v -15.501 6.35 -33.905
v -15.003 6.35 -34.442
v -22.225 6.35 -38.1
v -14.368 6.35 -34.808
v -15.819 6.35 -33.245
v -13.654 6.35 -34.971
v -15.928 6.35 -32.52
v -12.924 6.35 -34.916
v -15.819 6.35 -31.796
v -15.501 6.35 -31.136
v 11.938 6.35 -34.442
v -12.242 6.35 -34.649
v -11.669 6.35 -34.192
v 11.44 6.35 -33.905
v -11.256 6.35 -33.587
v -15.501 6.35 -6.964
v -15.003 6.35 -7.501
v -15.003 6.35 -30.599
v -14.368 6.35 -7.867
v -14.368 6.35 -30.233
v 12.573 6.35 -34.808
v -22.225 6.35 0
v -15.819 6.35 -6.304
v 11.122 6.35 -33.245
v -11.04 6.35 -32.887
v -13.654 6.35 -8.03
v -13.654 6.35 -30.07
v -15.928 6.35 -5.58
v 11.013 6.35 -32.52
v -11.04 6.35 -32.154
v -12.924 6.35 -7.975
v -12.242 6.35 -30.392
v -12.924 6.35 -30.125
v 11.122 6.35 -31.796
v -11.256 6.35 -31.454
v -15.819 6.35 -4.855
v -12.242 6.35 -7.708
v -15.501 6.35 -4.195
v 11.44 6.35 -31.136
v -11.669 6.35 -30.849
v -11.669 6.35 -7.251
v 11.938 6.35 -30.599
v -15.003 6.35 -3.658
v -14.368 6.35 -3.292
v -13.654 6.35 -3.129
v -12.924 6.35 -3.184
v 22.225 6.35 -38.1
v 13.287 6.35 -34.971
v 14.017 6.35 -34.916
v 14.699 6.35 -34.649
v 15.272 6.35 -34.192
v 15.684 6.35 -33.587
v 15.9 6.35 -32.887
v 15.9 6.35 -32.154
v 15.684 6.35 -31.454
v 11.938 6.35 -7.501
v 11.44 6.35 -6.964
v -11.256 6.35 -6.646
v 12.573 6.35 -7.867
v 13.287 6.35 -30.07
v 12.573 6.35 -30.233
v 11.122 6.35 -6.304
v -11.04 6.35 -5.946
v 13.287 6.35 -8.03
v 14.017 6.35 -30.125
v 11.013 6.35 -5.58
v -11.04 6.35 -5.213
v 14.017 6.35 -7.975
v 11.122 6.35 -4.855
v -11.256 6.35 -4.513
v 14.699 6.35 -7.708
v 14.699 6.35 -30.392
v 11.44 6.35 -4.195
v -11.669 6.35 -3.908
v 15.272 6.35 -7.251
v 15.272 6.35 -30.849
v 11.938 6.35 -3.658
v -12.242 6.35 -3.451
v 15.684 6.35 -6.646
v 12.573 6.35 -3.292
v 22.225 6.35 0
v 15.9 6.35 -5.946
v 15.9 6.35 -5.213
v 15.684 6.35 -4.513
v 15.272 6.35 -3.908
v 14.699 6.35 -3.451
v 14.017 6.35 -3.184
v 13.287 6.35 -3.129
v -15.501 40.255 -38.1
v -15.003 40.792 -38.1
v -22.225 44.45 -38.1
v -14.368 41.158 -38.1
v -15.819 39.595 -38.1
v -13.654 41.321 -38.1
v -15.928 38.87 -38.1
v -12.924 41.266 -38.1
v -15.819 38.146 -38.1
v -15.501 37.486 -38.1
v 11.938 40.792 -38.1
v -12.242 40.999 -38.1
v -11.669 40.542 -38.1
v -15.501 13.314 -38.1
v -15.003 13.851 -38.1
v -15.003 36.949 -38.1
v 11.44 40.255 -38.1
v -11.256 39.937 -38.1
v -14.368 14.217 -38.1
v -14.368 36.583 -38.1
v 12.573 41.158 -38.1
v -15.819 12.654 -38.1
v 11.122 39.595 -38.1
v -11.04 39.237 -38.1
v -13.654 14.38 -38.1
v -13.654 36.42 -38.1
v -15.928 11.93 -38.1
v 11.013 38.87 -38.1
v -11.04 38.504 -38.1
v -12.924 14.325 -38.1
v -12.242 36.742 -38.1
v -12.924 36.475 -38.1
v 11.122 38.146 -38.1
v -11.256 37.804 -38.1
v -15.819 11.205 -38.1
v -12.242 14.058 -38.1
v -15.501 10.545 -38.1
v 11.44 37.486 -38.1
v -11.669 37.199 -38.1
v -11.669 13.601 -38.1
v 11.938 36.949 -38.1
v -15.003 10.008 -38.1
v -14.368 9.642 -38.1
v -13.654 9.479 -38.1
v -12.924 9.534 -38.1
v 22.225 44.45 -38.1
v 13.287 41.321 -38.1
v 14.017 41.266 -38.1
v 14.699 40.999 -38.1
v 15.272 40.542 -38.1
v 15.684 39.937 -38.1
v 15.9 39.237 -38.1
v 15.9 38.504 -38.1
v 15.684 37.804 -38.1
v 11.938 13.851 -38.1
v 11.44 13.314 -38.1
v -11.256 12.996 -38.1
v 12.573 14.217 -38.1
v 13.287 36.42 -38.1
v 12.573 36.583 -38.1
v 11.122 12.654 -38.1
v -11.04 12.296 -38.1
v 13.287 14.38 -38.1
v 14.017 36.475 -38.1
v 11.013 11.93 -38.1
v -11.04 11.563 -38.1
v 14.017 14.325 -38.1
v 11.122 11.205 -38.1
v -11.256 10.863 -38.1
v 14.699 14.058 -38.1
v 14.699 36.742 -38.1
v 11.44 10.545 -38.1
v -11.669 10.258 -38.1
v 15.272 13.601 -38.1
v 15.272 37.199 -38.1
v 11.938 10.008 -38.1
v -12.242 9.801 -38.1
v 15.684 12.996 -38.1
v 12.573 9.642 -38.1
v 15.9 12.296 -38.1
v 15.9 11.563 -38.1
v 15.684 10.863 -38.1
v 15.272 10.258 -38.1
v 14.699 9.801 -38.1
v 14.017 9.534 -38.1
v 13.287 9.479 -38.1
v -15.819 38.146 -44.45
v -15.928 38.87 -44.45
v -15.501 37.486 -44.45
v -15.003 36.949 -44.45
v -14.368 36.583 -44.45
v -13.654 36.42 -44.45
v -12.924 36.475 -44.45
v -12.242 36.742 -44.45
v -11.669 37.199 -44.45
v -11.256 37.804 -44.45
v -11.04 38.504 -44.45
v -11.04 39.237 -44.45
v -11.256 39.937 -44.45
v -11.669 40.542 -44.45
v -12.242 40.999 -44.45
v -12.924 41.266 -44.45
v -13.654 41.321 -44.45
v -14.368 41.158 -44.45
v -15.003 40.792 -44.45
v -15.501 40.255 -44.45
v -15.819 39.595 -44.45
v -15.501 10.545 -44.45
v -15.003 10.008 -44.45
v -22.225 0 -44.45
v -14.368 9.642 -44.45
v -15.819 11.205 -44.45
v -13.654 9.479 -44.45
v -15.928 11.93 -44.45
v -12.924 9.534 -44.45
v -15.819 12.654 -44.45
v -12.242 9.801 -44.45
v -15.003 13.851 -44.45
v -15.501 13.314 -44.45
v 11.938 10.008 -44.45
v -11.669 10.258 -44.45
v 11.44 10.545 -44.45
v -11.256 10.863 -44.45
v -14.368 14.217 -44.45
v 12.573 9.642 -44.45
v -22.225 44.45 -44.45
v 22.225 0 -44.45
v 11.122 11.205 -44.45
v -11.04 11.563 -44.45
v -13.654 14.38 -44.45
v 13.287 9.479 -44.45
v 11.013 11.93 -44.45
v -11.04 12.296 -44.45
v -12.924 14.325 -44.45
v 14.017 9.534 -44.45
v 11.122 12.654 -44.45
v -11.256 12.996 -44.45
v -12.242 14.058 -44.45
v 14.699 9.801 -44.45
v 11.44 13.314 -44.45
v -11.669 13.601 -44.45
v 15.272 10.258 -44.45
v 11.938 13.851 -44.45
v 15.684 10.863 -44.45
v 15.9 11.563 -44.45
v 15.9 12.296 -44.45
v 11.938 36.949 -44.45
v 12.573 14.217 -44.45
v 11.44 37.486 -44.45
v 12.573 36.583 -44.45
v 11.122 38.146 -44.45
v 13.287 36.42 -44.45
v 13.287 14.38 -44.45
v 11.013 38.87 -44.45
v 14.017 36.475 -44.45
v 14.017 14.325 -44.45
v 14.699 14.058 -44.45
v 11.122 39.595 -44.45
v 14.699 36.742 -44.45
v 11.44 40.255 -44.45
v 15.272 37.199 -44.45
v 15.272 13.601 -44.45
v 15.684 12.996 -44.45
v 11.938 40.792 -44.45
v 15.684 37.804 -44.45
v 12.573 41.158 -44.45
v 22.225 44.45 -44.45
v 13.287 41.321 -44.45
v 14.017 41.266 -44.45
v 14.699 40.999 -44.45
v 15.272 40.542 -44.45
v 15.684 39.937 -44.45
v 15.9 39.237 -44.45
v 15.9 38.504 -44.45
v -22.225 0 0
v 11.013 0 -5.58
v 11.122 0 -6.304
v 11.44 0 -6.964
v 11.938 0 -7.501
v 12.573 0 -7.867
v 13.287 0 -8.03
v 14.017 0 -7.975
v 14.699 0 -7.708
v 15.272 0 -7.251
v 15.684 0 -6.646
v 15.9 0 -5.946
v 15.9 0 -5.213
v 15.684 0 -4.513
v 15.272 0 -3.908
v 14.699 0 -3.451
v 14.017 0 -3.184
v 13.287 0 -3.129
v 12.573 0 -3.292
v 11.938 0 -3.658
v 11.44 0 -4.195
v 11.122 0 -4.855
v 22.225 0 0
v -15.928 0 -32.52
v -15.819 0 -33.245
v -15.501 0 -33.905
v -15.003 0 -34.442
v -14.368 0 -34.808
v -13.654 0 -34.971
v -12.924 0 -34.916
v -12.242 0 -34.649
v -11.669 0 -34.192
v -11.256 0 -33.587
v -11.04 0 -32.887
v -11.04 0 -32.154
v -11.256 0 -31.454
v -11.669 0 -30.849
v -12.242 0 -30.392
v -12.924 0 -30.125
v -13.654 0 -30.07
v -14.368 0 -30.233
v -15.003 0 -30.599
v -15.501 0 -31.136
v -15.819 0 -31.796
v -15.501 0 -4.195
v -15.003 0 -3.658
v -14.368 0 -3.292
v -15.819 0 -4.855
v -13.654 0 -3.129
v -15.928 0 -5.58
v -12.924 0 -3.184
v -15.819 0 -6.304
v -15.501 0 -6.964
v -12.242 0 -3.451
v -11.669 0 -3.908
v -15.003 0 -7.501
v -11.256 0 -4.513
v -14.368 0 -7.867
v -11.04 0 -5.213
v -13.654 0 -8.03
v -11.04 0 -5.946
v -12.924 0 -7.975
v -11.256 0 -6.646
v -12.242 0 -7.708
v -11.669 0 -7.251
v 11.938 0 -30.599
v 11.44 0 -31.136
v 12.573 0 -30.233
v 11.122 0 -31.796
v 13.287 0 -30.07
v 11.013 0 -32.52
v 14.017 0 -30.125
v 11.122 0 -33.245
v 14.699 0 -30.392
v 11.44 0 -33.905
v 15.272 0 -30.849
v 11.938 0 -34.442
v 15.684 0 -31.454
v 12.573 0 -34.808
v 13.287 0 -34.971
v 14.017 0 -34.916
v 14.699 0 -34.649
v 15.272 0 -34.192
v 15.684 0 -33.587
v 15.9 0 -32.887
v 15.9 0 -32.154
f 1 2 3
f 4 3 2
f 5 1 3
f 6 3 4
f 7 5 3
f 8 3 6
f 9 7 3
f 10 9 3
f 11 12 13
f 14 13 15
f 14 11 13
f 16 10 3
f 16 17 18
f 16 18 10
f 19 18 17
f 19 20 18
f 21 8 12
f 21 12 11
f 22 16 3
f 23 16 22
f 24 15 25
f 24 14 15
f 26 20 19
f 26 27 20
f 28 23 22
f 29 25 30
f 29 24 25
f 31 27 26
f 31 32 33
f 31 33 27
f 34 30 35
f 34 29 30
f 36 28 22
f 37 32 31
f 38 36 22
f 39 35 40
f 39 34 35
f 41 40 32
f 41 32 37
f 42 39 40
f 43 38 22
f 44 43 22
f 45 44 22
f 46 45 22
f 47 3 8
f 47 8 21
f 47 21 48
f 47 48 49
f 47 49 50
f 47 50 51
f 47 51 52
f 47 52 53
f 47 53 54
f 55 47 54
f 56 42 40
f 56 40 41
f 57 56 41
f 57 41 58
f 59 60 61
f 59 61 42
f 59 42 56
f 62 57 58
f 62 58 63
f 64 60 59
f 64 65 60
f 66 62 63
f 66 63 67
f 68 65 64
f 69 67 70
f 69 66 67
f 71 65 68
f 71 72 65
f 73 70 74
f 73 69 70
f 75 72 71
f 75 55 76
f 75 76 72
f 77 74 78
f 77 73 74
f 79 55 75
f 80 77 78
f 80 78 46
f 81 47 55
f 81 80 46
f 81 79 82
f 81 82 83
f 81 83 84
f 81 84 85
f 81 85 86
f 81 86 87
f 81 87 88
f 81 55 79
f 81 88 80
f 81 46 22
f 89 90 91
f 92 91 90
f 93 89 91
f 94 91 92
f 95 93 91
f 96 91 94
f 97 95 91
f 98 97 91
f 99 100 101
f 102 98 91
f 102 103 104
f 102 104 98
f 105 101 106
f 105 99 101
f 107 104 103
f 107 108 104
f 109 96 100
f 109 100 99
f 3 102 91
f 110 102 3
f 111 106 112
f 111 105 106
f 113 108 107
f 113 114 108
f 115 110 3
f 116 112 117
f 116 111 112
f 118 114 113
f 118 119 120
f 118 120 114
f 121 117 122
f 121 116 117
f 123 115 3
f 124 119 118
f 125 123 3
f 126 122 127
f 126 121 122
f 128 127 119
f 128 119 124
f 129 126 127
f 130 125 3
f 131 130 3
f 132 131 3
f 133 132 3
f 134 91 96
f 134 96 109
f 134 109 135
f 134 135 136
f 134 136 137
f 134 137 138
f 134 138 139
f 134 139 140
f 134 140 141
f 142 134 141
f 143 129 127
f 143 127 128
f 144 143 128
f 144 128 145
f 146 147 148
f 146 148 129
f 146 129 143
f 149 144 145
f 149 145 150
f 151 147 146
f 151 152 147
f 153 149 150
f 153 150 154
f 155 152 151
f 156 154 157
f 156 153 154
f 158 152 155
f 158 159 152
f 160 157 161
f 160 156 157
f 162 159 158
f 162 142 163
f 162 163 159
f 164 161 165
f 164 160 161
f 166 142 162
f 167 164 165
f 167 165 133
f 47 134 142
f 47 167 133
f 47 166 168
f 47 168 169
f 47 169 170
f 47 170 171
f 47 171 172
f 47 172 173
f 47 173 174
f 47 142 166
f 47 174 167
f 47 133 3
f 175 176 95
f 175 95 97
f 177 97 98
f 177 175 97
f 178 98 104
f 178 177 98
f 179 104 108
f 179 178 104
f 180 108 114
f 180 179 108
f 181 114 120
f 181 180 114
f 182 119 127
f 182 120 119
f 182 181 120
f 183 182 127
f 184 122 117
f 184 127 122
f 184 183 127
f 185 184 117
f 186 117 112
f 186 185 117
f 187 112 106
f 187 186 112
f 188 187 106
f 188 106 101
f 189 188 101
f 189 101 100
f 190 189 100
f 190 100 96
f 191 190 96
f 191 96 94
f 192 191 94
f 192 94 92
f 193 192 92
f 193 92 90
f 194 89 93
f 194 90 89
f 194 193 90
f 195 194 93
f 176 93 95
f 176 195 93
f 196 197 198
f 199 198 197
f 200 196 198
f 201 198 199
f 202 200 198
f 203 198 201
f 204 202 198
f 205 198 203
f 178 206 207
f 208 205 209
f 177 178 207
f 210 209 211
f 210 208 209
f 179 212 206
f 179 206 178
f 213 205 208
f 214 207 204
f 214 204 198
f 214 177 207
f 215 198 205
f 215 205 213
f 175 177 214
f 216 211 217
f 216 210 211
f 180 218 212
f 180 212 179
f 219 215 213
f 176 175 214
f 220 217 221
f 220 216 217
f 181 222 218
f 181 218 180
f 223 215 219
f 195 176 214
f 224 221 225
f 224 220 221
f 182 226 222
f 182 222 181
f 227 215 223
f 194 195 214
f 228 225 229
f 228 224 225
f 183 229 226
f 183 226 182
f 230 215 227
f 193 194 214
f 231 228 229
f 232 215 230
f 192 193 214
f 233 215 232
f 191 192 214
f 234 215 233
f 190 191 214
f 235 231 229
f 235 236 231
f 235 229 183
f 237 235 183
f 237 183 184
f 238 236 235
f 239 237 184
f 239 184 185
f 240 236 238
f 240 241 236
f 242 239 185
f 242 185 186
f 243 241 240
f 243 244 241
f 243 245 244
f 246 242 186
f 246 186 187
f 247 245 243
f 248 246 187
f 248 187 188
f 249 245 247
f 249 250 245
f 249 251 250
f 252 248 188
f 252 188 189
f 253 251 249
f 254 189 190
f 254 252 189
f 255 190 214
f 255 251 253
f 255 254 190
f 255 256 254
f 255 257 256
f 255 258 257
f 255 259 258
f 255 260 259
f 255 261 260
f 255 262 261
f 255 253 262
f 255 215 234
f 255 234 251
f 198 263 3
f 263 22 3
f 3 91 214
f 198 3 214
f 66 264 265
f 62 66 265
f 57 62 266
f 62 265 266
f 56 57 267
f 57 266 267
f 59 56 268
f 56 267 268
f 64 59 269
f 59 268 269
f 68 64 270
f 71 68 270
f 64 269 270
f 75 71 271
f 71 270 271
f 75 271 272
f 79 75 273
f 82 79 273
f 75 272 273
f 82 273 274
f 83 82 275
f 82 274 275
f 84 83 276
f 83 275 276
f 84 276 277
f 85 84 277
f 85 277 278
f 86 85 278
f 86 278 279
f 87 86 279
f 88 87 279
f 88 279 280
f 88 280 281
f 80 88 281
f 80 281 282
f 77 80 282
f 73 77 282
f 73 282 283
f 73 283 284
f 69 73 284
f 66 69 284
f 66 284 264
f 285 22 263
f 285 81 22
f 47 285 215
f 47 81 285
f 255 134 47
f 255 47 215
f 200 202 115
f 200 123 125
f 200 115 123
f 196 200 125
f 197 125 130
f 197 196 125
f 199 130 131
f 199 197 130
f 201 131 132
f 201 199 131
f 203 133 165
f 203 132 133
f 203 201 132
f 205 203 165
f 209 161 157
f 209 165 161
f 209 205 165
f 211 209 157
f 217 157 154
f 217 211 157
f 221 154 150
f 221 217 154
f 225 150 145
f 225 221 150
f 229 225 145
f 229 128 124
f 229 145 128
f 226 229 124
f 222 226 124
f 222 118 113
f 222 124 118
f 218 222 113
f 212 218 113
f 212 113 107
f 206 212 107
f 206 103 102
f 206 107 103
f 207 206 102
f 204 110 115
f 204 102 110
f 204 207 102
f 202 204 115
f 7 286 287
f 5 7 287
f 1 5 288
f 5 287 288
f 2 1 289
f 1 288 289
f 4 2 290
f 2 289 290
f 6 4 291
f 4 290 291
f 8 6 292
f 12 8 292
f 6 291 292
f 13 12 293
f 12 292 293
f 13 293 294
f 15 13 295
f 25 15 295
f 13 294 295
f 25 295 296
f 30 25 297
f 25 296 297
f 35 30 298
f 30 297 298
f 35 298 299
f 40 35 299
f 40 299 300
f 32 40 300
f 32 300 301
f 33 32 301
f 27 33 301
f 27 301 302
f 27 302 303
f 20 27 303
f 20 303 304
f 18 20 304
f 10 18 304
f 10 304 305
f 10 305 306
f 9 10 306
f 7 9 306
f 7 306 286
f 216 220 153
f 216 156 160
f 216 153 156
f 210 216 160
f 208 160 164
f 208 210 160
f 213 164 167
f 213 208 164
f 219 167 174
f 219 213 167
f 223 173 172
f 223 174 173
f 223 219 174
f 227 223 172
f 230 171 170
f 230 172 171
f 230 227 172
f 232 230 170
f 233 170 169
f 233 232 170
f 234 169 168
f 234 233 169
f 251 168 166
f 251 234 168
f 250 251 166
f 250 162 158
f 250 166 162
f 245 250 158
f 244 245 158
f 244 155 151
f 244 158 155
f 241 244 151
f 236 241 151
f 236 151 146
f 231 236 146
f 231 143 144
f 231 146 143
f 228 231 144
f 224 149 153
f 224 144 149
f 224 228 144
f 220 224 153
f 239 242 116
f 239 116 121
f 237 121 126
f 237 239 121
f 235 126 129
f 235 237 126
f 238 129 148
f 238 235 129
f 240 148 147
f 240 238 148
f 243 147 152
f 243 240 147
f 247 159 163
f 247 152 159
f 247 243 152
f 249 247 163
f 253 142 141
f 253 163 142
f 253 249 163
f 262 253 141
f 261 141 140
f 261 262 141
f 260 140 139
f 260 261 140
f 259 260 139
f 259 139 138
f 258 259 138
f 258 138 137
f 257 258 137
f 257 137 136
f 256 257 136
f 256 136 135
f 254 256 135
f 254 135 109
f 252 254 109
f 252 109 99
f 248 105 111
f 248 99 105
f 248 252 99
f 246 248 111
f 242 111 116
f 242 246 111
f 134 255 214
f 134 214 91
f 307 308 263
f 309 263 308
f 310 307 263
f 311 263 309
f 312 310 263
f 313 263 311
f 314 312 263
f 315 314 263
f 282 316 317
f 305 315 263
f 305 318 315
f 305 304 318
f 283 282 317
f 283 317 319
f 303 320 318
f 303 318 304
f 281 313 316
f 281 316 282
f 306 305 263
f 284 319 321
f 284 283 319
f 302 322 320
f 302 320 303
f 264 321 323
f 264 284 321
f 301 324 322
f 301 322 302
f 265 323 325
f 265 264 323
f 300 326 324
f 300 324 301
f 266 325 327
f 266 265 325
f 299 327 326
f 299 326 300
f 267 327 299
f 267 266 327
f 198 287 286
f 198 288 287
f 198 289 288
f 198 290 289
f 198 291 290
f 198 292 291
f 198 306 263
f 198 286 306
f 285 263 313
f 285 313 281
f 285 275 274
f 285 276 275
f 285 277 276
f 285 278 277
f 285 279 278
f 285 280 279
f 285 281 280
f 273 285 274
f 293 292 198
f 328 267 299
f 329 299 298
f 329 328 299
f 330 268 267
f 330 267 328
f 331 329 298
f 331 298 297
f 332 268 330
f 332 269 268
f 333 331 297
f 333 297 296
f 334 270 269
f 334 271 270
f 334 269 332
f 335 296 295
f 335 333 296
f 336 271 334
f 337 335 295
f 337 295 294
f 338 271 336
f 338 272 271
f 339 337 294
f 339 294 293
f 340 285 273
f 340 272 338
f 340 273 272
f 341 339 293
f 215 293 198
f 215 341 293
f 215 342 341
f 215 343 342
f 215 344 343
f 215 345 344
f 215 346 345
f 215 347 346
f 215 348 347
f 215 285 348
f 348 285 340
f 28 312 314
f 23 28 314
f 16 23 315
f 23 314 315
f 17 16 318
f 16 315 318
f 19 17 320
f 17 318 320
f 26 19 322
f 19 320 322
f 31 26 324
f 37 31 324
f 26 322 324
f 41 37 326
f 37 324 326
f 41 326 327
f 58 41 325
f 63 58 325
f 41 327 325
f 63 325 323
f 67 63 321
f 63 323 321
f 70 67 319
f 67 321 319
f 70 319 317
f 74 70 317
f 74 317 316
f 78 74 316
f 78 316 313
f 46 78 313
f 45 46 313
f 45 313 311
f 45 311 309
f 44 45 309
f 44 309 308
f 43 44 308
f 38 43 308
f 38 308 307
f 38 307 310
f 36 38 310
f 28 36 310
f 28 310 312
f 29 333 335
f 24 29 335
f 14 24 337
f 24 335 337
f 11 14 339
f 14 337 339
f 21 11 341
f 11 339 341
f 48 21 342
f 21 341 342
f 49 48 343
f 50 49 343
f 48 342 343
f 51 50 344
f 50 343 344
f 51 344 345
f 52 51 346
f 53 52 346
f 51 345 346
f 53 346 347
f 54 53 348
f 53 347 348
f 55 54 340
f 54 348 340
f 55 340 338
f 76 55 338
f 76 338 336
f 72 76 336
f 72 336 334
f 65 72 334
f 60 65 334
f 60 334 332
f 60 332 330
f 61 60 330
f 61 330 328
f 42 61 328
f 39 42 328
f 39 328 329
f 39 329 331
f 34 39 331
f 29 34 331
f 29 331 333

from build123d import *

# Parameters (mm, degrees)
BOSS_EXTRUDE1_DEPTH          = 22.225
F_10_0_1935_DIAMETER_HOLE1_D = 4.9149


with BuildPart() as part:
    # Sketch1 → Boss-Extrude1 (new, symmetric)
    with BuildSketch(Plane(origin=(0, 0, 0), x_dir=(0, 0, -1), z_dir=(1, 0, 0))):
        Polygon((0, 0), (44.45, 0), (44.45, 44.45), (38.1, 44.45), (38.1, 6.35), (0, 6.35), align=None)
    extrude(amount=BOSS_EXTRUDE1_DEPTH, both=True)

    # #10 (0.1935) Diameter Hole1 (through all)
    with Locations(Plane(origin=(0, 6.35, 0), x_dir=(1, 0, 0), z_dir=(0, 1, 0))):
        with Locations((13.470384182, 5.579615818), (-13.470384182, 32.520384182), (-13.470384182, 5.579615818), (13.470384182, 32.520384182)):
            f_10_0_1935_diameter_hole1 = Hole(F_10_0_1935_DIAMETER_HOLE1_D / 2)

    # Mirror1: #10 (0.1935) Diameter Hole1 across plane
    add(f_10_0_1935_diameter_hole1.mirror(Plane(origin=(0, 22.225, -22.225), x_dir=(0, 0.7071067811865476, 0.7071067811865475), z_dir=(0, 0.7071067811865475, -0.7071067811865476))), mode=Mode.SUBTRACT)


solid = part.part
